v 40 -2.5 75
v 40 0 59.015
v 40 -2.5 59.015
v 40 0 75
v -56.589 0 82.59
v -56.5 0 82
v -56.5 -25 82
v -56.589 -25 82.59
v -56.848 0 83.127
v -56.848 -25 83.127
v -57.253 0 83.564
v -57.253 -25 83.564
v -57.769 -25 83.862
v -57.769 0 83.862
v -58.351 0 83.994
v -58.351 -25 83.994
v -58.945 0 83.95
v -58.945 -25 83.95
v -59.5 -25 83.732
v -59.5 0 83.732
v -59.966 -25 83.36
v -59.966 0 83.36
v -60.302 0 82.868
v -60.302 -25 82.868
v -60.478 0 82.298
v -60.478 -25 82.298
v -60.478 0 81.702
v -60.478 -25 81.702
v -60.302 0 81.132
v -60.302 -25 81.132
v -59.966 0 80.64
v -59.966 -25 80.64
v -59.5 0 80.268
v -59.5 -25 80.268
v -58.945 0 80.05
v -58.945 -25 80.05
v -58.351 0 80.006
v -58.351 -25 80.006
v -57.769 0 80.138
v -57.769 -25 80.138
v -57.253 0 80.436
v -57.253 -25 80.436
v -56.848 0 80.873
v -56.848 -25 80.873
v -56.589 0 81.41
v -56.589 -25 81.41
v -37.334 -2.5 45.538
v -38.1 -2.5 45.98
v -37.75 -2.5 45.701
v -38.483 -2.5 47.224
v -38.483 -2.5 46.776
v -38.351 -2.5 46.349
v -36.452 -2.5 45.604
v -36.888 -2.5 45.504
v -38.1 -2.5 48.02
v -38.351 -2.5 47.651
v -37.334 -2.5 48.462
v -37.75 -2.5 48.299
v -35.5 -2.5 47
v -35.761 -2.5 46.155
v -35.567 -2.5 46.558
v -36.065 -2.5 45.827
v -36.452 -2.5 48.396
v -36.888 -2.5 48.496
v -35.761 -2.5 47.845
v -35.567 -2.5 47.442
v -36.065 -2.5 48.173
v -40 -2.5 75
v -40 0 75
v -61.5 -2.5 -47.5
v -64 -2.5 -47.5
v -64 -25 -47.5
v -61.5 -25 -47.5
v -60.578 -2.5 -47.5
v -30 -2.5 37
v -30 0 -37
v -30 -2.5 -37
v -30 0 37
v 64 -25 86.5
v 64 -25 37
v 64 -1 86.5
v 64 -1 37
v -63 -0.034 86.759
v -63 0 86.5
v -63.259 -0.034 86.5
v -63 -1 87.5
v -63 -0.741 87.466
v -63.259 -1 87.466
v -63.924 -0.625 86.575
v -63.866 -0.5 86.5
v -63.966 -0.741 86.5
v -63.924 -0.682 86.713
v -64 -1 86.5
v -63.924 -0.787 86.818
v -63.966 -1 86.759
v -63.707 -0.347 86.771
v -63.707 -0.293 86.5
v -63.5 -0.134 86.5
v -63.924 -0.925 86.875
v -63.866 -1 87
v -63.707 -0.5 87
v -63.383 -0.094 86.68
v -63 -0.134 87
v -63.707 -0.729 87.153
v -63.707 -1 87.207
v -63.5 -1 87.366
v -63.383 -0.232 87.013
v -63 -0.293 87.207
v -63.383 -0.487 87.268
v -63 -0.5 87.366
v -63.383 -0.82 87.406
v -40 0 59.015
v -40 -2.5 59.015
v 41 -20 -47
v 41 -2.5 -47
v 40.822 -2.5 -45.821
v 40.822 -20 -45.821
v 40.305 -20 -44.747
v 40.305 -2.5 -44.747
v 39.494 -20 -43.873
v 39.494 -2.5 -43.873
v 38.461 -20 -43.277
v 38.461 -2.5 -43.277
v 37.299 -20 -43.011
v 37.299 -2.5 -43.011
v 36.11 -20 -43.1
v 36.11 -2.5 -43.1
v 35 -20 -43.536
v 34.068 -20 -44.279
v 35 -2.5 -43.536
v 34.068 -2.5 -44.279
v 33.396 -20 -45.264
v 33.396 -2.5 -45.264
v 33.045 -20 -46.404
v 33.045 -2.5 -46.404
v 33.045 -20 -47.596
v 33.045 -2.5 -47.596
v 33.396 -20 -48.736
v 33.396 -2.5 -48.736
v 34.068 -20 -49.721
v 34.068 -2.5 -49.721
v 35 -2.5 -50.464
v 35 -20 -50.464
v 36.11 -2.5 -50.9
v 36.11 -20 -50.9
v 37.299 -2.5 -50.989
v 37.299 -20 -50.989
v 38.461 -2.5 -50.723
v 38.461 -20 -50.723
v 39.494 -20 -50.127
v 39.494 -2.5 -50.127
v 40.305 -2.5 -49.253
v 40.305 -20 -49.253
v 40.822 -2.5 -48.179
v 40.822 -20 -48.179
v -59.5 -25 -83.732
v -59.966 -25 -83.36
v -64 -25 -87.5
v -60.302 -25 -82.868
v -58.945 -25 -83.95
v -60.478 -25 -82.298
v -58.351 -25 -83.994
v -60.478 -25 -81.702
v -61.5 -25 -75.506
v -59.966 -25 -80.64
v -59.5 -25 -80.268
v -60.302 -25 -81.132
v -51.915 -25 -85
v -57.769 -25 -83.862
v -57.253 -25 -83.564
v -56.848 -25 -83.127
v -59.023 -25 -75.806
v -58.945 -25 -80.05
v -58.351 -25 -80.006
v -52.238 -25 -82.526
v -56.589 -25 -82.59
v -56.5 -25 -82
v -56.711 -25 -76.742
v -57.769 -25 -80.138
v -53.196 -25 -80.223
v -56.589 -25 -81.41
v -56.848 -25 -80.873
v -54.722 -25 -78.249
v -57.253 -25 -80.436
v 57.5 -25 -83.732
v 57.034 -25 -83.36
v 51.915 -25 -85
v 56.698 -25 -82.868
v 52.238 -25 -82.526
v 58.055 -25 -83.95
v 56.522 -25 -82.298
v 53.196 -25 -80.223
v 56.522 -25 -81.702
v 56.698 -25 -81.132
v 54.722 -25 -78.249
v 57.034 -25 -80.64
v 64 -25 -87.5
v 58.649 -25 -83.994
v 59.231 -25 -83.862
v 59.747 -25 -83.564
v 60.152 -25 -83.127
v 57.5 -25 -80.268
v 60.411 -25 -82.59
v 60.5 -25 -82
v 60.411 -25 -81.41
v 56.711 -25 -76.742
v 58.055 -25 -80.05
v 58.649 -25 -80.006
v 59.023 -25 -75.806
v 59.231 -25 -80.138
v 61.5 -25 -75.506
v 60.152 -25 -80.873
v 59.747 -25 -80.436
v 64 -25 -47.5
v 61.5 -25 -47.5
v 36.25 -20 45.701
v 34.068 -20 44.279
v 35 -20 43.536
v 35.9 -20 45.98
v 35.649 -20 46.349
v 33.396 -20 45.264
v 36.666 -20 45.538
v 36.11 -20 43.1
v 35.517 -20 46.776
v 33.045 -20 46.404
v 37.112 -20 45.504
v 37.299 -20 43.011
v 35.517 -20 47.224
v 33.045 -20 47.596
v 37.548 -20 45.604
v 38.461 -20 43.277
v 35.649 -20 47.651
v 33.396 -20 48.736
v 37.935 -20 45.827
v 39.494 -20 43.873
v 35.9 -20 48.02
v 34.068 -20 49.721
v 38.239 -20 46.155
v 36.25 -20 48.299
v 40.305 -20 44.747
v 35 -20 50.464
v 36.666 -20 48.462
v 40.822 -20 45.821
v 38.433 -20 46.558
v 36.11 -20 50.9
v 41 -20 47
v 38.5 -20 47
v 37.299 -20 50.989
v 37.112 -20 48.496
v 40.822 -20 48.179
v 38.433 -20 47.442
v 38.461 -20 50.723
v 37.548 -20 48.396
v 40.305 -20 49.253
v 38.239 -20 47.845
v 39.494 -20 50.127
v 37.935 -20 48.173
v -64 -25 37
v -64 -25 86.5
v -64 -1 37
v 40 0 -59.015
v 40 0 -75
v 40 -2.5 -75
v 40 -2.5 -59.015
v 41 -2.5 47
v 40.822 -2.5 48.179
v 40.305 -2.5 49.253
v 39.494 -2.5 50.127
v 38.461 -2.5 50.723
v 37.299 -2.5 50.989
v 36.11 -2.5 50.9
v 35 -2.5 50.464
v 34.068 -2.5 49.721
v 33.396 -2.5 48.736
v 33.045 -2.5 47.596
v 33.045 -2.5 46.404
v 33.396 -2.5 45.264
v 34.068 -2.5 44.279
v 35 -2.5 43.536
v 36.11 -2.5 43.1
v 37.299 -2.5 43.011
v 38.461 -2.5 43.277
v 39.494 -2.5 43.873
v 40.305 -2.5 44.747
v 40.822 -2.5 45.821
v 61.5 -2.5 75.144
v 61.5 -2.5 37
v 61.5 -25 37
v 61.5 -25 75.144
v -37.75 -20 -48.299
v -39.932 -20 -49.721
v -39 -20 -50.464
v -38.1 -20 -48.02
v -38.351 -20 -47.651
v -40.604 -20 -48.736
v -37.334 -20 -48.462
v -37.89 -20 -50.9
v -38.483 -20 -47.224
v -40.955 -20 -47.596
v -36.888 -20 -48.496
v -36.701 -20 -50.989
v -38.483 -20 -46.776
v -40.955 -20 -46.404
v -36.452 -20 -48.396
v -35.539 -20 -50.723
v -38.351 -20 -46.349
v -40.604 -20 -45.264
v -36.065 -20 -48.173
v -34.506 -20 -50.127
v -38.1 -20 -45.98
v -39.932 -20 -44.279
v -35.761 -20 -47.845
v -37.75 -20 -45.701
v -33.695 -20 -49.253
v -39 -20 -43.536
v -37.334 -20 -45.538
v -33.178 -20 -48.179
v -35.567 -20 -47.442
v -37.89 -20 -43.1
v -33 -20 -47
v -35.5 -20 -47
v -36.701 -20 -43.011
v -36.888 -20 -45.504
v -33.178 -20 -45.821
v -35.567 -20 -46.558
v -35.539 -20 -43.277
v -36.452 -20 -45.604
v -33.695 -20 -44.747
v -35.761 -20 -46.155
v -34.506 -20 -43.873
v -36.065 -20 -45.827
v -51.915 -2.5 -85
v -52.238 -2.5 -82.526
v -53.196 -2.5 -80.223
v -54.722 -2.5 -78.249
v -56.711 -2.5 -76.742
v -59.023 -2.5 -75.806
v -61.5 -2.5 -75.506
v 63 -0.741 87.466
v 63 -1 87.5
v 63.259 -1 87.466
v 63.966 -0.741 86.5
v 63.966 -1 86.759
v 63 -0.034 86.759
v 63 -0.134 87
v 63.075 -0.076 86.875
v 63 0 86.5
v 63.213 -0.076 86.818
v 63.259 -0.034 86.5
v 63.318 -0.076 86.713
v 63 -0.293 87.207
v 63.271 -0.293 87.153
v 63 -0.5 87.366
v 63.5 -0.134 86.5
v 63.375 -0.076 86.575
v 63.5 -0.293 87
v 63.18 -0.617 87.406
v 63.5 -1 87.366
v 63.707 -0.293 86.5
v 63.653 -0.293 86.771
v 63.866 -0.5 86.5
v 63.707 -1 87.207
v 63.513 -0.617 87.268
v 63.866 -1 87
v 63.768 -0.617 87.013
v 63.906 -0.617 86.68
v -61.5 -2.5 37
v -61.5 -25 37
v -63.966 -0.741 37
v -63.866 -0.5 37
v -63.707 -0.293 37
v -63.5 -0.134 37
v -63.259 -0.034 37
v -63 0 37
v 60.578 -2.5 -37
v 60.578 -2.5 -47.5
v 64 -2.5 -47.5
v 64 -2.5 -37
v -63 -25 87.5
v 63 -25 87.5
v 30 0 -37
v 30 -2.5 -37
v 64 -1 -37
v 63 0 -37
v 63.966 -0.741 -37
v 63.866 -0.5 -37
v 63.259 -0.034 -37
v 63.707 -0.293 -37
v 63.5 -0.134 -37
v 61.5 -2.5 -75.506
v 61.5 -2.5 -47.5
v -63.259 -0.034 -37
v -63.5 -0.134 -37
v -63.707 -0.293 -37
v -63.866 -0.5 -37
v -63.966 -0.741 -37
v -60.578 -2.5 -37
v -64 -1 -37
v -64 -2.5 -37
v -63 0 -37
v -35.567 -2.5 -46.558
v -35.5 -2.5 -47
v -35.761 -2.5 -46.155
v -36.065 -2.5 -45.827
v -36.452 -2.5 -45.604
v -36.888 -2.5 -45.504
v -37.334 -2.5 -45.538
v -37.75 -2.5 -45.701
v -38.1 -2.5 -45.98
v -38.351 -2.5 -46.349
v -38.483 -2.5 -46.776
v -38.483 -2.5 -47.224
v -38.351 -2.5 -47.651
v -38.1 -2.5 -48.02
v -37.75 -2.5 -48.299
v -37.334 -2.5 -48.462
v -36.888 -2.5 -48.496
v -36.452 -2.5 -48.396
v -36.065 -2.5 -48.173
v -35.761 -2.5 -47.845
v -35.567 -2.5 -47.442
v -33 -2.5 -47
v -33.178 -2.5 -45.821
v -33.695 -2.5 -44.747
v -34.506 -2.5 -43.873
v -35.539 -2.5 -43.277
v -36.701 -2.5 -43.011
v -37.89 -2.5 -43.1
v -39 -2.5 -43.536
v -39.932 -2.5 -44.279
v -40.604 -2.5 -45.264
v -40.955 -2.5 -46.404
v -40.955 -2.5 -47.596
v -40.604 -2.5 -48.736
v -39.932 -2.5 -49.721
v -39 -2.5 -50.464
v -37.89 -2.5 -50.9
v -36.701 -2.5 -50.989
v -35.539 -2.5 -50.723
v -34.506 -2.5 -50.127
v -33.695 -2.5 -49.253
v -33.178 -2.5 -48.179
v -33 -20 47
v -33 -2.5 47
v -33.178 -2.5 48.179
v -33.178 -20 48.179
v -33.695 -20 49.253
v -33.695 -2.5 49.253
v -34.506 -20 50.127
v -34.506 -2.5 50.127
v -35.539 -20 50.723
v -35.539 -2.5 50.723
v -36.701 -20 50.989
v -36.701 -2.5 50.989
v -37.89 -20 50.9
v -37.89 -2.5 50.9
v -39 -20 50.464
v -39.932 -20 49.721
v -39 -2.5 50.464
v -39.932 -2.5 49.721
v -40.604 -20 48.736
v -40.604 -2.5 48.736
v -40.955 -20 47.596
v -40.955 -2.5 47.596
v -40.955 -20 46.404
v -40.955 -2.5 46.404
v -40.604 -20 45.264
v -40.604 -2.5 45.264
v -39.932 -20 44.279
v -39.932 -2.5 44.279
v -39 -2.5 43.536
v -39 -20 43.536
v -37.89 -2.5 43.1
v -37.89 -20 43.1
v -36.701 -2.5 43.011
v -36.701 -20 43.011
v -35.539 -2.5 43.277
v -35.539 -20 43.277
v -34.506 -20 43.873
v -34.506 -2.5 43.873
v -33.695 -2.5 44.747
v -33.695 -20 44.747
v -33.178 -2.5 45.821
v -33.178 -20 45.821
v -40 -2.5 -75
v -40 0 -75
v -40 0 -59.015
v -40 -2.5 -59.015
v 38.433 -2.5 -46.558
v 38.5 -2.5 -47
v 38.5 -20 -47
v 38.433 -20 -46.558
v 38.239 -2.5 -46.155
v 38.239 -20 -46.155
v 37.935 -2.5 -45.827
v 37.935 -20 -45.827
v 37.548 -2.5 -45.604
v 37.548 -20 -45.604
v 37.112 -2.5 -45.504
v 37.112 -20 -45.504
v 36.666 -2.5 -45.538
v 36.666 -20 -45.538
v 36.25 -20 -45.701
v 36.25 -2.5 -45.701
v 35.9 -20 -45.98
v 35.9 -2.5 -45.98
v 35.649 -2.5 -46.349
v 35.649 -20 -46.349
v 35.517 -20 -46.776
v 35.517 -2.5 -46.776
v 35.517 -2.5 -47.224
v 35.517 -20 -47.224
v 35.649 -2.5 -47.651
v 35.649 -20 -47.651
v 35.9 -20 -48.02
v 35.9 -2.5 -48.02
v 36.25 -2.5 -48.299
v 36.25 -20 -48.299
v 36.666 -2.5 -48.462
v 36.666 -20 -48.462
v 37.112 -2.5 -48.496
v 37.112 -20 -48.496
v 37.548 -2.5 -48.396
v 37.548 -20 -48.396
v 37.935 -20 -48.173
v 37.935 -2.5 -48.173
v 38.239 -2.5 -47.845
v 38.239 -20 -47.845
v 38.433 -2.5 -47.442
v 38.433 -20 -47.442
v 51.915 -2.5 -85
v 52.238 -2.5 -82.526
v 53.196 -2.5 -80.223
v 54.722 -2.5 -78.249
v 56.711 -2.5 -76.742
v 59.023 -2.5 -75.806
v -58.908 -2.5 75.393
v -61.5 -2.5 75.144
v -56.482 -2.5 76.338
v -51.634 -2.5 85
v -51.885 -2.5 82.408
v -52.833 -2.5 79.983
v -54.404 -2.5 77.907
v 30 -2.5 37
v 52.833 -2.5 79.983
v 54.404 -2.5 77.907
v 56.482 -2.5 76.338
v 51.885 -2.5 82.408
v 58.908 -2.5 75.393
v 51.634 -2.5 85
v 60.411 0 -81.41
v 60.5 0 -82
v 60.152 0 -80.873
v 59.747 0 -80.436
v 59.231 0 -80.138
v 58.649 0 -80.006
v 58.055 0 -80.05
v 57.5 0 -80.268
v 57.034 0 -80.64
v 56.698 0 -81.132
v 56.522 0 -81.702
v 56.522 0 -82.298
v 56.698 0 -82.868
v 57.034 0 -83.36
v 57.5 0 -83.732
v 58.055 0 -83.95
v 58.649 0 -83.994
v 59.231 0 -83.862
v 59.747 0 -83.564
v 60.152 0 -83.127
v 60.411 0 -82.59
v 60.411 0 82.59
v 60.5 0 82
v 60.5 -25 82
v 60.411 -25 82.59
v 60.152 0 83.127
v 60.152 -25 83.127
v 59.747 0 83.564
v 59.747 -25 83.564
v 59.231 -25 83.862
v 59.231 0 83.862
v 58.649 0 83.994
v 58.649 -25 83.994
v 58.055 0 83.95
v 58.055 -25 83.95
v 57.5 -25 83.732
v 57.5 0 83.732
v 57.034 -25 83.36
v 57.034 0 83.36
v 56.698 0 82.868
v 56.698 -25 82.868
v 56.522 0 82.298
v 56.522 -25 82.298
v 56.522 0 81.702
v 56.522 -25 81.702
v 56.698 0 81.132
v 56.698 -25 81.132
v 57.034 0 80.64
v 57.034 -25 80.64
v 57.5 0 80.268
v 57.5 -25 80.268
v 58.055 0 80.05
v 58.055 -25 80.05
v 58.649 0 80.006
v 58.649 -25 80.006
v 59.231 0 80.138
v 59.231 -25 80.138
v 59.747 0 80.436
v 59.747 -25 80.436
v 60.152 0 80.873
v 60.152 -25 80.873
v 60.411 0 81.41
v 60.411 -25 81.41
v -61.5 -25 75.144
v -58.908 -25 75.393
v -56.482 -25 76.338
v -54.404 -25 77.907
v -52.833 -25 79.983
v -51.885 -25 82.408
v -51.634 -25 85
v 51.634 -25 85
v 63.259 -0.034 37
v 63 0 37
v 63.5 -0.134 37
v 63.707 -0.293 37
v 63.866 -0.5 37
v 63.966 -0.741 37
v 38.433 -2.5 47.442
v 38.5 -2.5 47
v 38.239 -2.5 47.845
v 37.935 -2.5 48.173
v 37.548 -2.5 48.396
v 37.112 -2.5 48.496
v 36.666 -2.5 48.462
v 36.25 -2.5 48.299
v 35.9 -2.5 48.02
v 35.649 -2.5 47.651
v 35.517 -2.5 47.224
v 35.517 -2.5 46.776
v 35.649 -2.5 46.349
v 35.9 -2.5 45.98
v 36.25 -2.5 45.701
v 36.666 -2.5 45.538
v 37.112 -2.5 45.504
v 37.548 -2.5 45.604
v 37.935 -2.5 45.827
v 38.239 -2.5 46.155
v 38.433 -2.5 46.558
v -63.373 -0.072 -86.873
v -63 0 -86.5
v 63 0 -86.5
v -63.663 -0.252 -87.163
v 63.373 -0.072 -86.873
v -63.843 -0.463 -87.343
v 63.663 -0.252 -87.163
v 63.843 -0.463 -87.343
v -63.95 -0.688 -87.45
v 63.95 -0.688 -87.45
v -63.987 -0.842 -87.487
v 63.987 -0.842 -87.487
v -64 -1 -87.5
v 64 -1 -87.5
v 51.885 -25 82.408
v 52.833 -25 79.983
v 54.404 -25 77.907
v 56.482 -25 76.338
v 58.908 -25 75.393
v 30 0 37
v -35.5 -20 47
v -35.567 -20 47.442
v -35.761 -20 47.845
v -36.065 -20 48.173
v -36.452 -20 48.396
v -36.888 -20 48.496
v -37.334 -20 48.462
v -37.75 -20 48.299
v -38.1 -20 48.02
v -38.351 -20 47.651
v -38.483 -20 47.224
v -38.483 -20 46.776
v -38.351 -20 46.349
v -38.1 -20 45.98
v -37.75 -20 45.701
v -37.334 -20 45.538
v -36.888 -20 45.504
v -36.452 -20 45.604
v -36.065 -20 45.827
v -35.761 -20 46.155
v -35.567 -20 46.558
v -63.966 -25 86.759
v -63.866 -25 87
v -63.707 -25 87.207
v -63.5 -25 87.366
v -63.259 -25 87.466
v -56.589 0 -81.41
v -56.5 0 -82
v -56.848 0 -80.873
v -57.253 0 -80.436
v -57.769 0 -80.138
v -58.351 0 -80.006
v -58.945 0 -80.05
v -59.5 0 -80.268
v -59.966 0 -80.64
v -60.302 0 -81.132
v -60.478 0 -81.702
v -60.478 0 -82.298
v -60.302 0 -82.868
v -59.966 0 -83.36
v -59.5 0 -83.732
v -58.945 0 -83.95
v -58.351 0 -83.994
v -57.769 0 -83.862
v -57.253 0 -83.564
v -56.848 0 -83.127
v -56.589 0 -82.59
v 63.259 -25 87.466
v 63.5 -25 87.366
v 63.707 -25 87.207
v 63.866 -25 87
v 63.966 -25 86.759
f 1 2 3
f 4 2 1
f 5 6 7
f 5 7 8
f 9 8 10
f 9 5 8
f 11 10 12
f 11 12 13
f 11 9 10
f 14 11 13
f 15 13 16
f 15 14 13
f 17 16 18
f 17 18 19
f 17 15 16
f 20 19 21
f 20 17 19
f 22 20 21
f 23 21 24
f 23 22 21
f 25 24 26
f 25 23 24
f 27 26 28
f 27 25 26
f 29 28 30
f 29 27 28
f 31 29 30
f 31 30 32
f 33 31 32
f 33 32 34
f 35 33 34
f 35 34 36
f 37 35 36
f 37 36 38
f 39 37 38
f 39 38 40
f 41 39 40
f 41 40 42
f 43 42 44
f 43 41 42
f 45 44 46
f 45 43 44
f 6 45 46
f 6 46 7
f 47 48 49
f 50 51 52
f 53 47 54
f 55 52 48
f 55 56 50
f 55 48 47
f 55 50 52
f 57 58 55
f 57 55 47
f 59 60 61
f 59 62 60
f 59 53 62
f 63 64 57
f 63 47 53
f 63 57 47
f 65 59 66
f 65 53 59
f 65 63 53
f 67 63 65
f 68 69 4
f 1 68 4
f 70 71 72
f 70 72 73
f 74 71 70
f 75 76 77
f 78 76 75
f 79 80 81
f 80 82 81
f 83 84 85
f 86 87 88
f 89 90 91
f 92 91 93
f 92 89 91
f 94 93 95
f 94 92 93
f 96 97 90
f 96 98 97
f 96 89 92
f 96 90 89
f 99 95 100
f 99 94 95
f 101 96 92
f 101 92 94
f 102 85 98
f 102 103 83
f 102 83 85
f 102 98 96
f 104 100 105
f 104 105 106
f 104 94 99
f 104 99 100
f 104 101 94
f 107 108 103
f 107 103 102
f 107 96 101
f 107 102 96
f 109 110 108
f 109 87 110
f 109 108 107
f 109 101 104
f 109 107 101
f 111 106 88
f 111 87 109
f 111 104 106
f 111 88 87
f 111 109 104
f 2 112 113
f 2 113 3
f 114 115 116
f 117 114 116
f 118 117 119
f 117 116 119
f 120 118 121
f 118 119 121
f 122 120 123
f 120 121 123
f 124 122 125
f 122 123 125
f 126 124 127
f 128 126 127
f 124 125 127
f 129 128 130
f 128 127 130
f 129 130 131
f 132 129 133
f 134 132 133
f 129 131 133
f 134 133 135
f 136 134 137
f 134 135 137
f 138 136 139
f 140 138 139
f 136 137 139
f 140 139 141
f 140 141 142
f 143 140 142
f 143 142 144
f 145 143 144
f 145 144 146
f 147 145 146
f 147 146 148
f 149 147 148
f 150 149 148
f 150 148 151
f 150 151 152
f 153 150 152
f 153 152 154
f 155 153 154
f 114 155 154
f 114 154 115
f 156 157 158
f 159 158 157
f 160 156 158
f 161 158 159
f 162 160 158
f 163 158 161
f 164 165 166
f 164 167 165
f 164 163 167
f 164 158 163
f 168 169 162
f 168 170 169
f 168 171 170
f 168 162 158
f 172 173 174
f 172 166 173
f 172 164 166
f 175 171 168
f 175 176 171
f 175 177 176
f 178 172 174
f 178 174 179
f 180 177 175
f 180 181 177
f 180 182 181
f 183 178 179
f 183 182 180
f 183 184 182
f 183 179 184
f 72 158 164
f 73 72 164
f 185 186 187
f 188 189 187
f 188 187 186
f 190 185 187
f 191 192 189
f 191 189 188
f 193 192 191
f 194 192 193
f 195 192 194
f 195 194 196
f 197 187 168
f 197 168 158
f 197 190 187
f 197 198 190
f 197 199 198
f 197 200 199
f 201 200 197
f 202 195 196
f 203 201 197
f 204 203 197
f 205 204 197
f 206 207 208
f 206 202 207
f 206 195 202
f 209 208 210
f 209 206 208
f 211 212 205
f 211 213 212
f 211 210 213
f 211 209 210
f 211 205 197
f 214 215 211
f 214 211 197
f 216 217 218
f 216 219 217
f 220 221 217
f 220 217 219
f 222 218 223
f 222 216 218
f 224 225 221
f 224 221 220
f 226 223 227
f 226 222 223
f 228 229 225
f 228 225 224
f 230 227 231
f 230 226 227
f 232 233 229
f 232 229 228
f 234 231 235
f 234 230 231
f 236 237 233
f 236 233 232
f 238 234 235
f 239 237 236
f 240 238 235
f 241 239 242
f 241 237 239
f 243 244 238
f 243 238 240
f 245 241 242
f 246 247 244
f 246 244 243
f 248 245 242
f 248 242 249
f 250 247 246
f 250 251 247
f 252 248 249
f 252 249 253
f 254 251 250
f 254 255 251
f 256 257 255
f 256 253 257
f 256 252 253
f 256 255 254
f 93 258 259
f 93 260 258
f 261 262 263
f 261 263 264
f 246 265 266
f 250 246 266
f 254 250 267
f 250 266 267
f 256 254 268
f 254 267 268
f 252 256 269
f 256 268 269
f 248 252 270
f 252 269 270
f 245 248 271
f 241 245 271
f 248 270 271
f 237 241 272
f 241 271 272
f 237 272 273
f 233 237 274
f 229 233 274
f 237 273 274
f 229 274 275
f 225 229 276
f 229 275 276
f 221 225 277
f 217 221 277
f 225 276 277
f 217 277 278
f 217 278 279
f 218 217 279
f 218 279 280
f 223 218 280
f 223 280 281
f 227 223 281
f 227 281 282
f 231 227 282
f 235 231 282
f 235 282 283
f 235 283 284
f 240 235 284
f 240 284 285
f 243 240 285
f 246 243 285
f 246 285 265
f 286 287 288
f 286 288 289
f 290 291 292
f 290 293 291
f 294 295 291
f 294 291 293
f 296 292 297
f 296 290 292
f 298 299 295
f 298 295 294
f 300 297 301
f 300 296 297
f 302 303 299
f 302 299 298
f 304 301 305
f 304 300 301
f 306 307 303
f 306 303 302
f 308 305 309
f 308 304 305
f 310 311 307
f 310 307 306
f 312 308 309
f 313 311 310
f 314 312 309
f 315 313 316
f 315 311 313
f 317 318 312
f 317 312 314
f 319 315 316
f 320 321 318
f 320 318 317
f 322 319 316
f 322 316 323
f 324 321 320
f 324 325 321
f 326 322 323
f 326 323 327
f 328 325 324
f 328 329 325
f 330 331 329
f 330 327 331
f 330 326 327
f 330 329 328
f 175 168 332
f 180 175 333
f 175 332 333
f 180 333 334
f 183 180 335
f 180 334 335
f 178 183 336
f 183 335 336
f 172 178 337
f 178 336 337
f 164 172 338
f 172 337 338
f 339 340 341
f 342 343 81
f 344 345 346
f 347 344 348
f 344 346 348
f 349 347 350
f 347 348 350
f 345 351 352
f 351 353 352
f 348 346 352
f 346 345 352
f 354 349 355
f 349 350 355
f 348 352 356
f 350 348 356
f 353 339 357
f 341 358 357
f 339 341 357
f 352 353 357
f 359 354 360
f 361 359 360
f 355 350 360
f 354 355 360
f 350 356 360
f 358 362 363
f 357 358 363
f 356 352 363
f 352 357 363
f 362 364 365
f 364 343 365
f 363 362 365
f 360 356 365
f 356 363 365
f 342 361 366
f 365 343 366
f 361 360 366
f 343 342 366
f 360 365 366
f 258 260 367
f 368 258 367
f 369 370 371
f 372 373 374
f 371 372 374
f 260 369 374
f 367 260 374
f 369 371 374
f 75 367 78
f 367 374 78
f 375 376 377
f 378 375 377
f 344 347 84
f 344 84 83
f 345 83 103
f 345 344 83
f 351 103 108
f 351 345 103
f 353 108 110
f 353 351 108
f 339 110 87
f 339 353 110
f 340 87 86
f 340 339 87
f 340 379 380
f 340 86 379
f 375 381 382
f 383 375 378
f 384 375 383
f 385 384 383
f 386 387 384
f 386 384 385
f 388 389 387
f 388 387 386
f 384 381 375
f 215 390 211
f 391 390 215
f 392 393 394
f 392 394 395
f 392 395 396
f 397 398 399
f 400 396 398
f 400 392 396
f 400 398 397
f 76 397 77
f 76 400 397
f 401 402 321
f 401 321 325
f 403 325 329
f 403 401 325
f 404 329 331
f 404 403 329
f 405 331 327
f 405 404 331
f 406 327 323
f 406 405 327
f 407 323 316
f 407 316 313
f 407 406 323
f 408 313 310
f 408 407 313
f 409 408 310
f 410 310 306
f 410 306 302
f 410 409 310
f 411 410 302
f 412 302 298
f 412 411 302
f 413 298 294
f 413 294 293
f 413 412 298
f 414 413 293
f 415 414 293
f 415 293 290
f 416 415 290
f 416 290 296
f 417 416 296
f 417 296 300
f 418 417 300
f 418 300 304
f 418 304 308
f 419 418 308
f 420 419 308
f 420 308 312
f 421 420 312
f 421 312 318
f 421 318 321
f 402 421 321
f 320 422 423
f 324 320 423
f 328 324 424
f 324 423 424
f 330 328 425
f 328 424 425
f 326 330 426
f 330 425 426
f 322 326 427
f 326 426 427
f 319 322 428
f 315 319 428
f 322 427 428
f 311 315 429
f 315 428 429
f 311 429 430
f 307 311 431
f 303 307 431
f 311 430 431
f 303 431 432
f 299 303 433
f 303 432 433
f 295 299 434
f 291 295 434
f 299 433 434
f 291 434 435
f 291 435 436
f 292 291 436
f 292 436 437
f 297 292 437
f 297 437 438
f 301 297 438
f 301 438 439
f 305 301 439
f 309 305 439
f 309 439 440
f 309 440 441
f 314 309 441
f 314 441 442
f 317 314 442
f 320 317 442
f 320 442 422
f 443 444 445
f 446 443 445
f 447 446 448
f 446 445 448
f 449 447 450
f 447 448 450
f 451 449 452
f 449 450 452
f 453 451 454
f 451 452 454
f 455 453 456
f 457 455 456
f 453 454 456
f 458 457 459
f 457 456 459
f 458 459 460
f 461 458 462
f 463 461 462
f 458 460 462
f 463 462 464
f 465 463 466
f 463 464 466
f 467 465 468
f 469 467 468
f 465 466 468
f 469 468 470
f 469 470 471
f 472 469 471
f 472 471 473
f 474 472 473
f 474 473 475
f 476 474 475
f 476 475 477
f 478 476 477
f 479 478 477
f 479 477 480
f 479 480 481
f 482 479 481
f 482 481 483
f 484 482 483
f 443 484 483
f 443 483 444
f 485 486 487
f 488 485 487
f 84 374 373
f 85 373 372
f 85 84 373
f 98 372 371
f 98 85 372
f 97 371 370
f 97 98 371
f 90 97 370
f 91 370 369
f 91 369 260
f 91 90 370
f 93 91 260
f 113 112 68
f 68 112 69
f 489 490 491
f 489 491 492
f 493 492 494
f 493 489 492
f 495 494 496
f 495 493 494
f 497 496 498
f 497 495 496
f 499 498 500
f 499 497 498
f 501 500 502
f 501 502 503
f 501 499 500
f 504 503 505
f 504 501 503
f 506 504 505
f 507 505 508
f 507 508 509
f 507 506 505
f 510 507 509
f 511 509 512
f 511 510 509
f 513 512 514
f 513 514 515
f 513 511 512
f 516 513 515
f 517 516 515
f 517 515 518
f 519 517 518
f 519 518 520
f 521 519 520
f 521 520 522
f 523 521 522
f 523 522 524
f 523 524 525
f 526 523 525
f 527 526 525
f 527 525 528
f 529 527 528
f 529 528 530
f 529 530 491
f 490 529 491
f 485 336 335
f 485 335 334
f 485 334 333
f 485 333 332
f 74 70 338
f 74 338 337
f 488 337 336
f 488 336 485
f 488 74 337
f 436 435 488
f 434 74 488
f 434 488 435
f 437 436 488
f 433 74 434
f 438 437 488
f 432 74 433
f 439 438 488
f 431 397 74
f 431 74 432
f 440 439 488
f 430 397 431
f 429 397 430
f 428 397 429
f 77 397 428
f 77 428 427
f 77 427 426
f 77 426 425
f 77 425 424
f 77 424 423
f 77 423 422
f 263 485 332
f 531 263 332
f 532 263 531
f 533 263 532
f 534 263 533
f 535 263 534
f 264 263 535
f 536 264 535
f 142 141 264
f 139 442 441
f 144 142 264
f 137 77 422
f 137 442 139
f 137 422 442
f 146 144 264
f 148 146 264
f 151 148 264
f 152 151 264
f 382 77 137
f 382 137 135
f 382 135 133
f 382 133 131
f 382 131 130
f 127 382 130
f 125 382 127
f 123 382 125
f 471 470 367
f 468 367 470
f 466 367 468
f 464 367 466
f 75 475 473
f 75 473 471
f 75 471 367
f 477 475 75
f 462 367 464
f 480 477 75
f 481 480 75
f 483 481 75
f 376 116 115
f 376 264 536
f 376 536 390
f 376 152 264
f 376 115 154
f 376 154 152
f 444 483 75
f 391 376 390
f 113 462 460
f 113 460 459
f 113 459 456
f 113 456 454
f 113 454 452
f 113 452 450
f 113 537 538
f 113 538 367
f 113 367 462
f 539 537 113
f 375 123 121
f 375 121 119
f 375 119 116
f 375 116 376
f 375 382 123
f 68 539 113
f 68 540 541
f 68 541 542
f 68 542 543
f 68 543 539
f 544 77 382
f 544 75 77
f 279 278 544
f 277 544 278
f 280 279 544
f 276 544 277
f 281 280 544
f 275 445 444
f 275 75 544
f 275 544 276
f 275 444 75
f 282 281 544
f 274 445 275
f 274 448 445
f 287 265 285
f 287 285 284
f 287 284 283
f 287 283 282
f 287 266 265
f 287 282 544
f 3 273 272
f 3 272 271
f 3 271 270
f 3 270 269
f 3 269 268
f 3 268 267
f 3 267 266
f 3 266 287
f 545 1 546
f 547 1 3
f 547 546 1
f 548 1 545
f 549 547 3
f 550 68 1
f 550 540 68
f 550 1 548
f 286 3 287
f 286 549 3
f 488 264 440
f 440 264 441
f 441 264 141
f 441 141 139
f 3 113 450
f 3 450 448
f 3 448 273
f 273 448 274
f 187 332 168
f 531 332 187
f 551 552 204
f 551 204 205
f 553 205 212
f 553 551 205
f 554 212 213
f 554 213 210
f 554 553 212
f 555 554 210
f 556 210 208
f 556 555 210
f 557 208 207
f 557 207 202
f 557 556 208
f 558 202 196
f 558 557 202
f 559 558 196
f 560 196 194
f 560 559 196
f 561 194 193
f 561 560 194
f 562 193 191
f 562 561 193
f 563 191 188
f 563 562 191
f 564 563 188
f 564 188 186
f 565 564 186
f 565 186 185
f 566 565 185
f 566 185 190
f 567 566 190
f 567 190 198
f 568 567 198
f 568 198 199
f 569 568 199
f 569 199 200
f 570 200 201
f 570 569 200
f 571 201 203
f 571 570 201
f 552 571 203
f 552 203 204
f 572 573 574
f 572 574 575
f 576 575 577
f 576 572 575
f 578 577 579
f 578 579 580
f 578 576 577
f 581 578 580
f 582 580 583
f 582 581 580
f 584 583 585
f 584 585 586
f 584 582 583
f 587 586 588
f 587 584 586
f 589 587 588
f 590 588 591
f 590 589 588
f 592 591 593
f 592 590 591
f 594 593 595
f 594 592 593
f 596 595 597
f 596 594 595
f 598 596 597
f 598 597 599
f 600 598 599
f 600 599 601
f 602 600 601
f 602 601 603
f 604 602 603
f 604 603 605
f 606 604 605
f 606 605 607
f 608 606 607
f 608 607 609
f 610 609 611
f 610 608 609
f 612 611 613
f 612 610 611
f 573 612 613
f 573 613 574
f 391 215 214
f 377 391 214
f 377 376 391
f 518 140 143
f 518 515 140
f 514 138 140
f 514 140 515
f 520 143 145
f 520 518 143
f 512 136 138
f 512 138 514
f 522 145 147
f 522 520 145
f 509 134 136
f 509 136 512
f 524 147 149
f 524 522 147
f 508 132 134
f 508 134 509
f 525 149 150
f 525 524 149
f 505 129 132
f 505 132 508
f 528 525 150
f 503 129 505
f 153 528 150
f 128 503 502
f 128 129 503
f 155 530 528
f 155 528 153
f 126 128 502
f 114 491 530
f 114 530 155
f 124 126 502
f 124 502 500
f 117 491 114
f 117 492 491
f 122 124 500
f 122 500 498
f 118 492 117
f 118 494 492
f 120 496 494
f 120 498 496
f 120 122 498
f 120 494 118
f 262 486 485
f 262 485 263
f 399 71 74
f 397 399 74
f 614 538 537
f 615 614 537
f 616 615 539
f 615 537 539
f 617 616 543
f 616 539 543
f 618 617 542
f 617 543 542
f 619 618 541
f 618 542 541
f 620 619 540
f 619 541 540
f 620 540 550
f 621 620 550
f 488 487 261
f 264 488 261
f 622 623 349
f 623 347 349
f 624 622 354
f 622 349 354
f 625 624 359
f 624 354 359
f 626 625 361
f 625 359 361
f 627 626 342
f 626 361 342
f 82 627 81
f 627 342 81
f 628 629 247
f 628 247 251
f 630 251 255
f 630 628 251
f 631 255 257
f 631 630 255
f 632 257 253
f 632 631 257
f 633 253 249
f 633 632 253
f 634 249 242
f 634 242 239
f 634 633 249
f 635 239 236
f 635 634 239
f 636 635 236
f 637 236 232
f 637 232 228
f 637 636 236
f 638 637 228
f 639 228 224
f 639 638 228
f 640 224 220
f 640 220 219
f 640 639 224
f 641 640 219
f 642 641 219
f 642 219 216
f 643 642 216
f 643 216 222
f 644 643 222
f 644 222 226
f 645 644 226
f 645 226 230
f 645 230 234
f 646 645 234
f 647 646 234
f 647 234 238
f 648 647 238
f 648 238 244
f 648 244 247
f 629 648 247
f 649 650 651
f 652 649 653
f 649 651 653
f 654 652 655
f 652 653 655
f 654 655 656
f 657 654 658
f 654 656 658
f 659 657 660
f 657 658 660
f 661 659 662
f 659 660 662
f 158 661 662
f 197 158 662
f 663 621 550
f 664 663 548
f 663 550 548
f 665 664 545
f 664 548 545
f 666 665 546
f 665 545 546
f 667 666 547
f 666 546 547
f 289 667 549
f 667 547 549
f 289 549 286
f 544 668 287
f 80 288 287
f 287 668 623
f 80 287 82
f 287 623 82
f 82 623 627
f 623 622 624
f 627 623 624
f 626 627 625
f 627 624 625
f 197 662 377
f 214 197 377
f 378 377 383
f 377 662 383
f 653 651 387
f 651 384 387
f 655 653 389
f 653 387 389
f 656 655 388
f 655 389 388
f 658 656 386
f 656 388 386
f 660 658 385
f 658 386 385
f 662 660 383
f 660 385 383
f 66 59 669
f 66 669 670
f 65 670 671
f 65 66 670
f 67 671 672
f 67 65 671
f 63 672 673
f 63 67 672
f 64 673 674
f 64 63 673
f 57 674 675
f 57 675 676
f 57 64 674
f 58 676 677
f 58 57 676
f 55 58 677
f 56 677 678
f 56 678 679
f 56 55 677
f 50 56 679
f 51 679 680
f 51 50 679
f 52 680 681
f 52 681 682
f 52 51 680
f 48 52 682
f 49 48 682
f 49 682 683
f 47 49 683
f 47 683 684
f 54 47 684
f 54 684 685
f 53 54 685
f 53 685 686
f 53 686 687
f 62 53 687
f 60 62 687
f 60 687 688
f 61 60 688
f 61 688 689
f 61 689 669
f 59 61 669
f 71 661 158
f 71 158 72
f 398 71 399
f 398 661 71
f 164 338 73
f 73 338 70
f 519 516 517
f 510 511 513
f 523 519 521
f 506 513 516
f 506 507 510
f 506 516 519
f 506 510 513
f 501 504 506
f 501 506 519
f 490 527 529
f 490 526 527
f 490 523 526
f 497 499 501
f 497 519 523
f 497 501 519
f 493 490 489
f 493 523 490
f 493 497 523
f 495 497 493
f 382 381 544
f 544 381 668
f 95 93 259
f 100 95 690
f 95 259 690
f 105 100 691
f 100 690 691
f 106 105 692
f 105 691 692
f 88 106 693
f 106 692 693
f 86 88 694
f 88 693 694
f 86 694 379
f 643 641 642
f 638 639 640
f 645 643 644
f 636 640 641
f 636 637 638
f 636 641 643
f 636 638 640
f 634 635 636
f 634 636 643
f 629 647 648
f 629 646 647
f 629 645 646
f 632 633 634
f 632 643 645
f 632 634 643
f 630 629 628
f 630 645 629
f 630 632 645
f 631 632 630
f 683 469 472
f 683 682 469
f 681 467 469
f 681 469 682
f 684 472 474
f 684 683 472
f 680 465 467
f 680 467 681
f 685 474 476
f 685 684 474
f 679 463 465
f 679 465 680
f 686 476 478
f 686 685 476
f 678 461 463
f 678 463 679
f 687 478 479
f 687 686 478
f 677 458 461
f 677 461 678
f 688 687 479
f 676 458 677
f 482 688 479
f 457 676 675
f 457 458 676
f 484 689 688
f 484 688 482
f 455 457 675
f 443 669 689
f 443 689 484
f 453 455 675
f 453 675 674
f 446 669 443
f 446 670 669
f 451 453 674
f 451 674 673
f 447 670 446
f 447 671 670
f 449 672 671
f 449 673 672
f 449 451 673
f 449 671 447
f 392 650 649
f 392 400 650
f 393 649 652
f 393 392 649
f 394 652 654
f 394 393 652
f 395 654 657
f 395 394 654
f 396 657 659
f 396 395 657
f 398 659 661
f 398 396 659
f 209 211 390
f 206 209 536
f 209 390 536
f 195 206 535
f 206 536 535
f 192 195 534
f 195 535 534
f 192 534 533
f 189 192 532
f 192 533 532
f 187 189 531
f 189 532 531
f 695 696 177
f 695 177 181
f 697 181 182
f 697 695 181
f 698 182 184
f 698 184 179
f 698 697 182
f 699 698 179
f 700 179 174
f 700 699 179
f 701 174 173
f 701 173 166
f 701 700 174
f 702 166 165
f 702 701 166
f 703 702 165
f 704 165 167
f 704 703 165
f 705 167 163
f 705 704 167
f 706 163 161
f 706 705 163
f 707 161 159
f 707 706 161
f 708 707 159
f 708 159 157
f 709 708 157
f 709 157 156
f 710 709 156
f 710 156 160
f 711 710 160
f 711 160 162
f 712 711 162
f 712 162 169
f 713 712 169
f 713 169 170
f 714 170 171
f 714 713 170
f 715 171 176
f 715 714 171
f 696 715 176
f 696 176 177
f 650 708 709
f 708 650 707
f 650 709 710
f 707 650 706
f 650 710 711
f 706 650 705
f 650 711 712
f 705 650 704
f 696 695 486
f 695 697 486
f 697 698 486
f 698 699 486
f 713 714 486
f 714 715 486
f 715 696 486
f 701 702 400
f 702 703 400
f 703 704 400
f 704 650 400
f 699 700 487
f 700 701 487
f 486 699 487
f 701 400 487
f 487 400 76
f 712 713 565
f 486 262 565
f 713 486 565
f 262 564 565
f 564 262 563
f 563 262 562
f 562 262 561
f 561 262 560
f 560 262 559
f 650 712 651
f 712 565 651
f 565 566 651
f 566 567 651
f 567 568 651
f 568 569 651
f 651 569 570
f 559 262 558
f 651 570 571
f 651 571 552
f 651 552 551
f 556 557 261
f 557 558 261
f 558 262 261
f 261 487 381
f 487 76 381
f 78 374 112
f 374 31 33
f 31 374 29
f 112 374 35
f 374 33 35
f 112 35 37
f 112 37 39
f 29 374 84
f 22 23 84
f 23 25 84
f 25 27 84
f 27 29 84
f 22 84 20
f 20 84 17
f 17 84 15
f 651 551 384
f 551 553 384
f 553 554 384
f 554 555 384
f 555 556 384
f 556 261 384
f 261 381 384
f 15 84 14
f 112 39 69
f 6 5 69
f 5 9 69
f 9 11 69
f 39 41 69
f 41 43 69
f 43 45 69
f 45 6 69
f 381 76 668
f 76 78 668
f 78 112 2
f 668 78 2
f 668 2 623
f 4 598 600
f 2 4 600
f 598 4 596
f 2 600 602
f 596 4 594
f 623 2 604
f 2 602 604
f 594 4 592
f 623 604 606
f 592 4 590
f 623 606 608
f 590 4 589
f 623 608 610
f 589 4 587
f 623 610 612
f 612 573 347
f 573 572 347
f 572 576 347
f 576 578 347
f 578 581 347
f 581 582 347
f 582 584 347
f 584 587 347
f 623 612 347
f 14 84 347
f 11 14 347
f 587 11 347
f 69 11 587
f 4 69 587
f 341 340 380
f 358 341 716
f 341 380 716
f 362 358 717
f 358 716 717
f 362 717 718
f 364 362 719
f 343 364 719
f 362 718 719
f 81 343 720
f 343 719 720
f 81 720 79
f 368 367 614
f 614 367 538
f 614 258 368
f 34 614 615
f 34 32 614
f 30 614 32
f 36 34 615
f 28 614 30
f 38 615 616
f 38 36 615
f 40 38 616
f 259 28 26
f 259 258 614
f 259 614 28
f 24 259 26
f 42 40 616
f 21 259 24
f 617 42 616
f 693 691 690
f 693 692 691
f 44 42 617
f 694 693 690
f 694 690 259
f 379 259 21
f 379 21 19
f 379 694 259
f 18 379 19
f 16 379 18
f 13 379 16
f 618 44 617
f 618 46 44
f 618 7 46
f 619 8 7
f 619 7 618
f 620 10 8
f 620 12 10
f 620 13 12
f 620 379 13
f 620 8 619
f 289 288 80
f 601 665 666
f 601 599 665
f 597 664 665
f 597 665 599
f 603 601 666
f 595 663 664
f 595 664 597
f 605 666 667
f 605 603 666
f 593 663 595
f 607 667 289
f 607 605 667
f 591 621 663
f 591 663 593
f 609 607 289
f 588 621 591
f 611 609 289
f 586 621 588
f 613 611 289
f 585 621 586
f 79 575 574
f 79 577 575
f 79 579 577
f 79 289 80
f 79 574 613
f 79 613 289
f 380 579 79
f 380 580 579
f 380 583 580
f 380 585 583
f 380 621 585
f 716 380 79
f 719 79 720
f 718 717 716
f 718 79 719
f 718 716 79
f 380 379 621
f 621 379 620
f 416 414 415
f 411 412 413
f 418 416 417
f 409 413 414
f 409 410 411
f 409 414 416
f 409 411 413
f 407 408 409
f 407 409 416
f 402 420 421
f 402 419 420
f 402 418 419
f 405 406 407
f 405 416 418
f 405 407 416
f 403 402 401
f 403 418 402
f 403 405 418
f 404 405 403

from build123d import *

# Parameters (mm, degrees)
F0_W      = 128
F0_H      = 175
F1_DEPTH  = 25
F2_T      = -2.5
F3_R      = 4
F3_R_2    = 1.5
F4_DEPTH  = 20
F7_DEPTH  = 25
F8_R      = 2
F9_DEPTH  = 25
F11_W     = 40
F11_H     = 74
F11_W_2   = 80
F11_H_2   = 15.985015
F12_DEPTH = 36
F13_R     = 1
F15_W     = 5.084744
F15_H     = 25.423729
F16_DEPTH = 47.5


with BuildPart() as f1:
    # F0 (on Front) → F1 (new body)
    with BuildSketch(Plane.XZ):
        Rectangle(F0_W, F0_H)
    extrude(amount=F1_DEPTH)

    # F2
    f2_openings = [f1.faces().sort_by_distance(p)[0] for p in [
        (0, -25, 0),
    ]]
    offset(amount=F2_T, openings=f2_openings)

    # F3 (on Front) → F4 (join)
    with BuildSketch(Plane.XZ):
        with Locations((-37, 47)):
            Circle(F3_R)
        with Locations((-37, 47)):
            Circle(F3_R_2, mode=Mode.SUBTRACT)
        with Locations((37, 47)):
            Circle(F3_R)
        with Locations((37, 47)):
            Circle(F3_R_2, mode=Mode.SUBTRACT)
        with Locations((37, -47)):
            Circle(F3_R)
        with Locations((37, -47)):
            Circle(F3_R_2, mode=Mode.SUBTRACT)
        with Locations((-37, -47)):
            Circle(F3_R)
        with Locations((-37, -47)):
            Circle(F3_R_2, mode=Mode.SUBTRACT)
    extrude(amount=F4_DEPTH)

    # F6 (on Front) → F7 (join)
    with BuildSketch(Plane.XZ):
        with BuildLine():
            Line((-61.93007, -75.520713), (-61.93007, -85.520713))
            Line((-61.93007, -85.520713), (-51.93007, -85.520713))
            ThreePointArc((-51.93007, -85.520713), (-54.690152, -78.280795), (-61.93007, -75.520713))
        make_face()
        with BuildLine():
            ThreePointArc((61.93007, -75.520713), (54.690152, -78.280795), (51.93007, -85.520713))
            Line((51.93007, -85.520713), (61.93007, -85.520713))
            Line((61.93007, -85.520713), (61.93007, -75.520713))
        make_face()
        with BuildLine():
            ThreePointArc((-61.6409, 75.150812), (-54.400982, 77.910894), (-51.6409, 85.150812))
            Line((-51.6409, 85.150812), (-61.6409, 85.150812))
            Line((-61.6409, 85.150812), (-61.6409, 75.150812))
        make_face()
        with BuildLine():
            Line((61.6409, 75.150812), (61.6409, 85.150812))
            Line((61.6409, 85.150812), (51.6409, 85.150812))
            ThreePointArc((51.6409, 85.150812), (54.400982, 77.910894), (61.6409, 75.150812))
        make_face()
    extrude(amount=F7_DEPTH)

    # F8 (on Front) → F9 (cut)
    with BuildSketch(Plane.XZ):
        with Locations((-58.5, 82)):
            Circle(F8_R)
        with Locations((-58.5, -82)):
            Circle(F8_R)
        with Locations((58.5, -82)):
            Circle(F8_R)
        with Locations((58.5, 82)):
            Circle(F8_R)
    extrude(amount=F9_DEPTH, mode=Mode.SUBTRACT)

    # F11 (on offset) → F12 (cut)
    with BuildSketch(Plane.XZ.offset(-10)):
        with Locations((-50, 0)):
            Rectangle(F11_W, F11_H)
        with Locations((50, 0)):
            Rectangle(F11_W, F11_H)
        with Locations((0, 67.007492)):
            Rectangle(F11_W_2, F11_H_2)
        with Locations((0, -67.007492)):
            Rectangle(F11_W_2, F11_H_2)
    extrude(amount=F12_DEPTH, mode=Mode.SUBTRACT)

    # F13
    f13_edges = [f1.edges().sort_by_distance(p)[0] for p in [
        (64, -12.5, 87.5),
        (0, 0, 87.5),
        (64, 0, 62.25),
        (64, 0, -62.25),
        (0, 0, -87.5),
        (-64, 0, 62.25),
        (-64, 0, -62.25),
        (-64, -12.5, 87.5),
    ]]
    fillet(f13_edges, radius=F13_R)

    # F15 (on Top) → F16 (cut)
    with BuildSketch(Plane.XY):
        with Locations((-63.120628, -15.211864)):
            Rectangle(F15_W, F15_H)
        with Locations((63.120628, -15.211864)):
            Rectangle(F15_W, F15_H)
    extrude(amount=-F16_DEPTH, mode=Mode.SUBTRACT)


solid = f1.part
